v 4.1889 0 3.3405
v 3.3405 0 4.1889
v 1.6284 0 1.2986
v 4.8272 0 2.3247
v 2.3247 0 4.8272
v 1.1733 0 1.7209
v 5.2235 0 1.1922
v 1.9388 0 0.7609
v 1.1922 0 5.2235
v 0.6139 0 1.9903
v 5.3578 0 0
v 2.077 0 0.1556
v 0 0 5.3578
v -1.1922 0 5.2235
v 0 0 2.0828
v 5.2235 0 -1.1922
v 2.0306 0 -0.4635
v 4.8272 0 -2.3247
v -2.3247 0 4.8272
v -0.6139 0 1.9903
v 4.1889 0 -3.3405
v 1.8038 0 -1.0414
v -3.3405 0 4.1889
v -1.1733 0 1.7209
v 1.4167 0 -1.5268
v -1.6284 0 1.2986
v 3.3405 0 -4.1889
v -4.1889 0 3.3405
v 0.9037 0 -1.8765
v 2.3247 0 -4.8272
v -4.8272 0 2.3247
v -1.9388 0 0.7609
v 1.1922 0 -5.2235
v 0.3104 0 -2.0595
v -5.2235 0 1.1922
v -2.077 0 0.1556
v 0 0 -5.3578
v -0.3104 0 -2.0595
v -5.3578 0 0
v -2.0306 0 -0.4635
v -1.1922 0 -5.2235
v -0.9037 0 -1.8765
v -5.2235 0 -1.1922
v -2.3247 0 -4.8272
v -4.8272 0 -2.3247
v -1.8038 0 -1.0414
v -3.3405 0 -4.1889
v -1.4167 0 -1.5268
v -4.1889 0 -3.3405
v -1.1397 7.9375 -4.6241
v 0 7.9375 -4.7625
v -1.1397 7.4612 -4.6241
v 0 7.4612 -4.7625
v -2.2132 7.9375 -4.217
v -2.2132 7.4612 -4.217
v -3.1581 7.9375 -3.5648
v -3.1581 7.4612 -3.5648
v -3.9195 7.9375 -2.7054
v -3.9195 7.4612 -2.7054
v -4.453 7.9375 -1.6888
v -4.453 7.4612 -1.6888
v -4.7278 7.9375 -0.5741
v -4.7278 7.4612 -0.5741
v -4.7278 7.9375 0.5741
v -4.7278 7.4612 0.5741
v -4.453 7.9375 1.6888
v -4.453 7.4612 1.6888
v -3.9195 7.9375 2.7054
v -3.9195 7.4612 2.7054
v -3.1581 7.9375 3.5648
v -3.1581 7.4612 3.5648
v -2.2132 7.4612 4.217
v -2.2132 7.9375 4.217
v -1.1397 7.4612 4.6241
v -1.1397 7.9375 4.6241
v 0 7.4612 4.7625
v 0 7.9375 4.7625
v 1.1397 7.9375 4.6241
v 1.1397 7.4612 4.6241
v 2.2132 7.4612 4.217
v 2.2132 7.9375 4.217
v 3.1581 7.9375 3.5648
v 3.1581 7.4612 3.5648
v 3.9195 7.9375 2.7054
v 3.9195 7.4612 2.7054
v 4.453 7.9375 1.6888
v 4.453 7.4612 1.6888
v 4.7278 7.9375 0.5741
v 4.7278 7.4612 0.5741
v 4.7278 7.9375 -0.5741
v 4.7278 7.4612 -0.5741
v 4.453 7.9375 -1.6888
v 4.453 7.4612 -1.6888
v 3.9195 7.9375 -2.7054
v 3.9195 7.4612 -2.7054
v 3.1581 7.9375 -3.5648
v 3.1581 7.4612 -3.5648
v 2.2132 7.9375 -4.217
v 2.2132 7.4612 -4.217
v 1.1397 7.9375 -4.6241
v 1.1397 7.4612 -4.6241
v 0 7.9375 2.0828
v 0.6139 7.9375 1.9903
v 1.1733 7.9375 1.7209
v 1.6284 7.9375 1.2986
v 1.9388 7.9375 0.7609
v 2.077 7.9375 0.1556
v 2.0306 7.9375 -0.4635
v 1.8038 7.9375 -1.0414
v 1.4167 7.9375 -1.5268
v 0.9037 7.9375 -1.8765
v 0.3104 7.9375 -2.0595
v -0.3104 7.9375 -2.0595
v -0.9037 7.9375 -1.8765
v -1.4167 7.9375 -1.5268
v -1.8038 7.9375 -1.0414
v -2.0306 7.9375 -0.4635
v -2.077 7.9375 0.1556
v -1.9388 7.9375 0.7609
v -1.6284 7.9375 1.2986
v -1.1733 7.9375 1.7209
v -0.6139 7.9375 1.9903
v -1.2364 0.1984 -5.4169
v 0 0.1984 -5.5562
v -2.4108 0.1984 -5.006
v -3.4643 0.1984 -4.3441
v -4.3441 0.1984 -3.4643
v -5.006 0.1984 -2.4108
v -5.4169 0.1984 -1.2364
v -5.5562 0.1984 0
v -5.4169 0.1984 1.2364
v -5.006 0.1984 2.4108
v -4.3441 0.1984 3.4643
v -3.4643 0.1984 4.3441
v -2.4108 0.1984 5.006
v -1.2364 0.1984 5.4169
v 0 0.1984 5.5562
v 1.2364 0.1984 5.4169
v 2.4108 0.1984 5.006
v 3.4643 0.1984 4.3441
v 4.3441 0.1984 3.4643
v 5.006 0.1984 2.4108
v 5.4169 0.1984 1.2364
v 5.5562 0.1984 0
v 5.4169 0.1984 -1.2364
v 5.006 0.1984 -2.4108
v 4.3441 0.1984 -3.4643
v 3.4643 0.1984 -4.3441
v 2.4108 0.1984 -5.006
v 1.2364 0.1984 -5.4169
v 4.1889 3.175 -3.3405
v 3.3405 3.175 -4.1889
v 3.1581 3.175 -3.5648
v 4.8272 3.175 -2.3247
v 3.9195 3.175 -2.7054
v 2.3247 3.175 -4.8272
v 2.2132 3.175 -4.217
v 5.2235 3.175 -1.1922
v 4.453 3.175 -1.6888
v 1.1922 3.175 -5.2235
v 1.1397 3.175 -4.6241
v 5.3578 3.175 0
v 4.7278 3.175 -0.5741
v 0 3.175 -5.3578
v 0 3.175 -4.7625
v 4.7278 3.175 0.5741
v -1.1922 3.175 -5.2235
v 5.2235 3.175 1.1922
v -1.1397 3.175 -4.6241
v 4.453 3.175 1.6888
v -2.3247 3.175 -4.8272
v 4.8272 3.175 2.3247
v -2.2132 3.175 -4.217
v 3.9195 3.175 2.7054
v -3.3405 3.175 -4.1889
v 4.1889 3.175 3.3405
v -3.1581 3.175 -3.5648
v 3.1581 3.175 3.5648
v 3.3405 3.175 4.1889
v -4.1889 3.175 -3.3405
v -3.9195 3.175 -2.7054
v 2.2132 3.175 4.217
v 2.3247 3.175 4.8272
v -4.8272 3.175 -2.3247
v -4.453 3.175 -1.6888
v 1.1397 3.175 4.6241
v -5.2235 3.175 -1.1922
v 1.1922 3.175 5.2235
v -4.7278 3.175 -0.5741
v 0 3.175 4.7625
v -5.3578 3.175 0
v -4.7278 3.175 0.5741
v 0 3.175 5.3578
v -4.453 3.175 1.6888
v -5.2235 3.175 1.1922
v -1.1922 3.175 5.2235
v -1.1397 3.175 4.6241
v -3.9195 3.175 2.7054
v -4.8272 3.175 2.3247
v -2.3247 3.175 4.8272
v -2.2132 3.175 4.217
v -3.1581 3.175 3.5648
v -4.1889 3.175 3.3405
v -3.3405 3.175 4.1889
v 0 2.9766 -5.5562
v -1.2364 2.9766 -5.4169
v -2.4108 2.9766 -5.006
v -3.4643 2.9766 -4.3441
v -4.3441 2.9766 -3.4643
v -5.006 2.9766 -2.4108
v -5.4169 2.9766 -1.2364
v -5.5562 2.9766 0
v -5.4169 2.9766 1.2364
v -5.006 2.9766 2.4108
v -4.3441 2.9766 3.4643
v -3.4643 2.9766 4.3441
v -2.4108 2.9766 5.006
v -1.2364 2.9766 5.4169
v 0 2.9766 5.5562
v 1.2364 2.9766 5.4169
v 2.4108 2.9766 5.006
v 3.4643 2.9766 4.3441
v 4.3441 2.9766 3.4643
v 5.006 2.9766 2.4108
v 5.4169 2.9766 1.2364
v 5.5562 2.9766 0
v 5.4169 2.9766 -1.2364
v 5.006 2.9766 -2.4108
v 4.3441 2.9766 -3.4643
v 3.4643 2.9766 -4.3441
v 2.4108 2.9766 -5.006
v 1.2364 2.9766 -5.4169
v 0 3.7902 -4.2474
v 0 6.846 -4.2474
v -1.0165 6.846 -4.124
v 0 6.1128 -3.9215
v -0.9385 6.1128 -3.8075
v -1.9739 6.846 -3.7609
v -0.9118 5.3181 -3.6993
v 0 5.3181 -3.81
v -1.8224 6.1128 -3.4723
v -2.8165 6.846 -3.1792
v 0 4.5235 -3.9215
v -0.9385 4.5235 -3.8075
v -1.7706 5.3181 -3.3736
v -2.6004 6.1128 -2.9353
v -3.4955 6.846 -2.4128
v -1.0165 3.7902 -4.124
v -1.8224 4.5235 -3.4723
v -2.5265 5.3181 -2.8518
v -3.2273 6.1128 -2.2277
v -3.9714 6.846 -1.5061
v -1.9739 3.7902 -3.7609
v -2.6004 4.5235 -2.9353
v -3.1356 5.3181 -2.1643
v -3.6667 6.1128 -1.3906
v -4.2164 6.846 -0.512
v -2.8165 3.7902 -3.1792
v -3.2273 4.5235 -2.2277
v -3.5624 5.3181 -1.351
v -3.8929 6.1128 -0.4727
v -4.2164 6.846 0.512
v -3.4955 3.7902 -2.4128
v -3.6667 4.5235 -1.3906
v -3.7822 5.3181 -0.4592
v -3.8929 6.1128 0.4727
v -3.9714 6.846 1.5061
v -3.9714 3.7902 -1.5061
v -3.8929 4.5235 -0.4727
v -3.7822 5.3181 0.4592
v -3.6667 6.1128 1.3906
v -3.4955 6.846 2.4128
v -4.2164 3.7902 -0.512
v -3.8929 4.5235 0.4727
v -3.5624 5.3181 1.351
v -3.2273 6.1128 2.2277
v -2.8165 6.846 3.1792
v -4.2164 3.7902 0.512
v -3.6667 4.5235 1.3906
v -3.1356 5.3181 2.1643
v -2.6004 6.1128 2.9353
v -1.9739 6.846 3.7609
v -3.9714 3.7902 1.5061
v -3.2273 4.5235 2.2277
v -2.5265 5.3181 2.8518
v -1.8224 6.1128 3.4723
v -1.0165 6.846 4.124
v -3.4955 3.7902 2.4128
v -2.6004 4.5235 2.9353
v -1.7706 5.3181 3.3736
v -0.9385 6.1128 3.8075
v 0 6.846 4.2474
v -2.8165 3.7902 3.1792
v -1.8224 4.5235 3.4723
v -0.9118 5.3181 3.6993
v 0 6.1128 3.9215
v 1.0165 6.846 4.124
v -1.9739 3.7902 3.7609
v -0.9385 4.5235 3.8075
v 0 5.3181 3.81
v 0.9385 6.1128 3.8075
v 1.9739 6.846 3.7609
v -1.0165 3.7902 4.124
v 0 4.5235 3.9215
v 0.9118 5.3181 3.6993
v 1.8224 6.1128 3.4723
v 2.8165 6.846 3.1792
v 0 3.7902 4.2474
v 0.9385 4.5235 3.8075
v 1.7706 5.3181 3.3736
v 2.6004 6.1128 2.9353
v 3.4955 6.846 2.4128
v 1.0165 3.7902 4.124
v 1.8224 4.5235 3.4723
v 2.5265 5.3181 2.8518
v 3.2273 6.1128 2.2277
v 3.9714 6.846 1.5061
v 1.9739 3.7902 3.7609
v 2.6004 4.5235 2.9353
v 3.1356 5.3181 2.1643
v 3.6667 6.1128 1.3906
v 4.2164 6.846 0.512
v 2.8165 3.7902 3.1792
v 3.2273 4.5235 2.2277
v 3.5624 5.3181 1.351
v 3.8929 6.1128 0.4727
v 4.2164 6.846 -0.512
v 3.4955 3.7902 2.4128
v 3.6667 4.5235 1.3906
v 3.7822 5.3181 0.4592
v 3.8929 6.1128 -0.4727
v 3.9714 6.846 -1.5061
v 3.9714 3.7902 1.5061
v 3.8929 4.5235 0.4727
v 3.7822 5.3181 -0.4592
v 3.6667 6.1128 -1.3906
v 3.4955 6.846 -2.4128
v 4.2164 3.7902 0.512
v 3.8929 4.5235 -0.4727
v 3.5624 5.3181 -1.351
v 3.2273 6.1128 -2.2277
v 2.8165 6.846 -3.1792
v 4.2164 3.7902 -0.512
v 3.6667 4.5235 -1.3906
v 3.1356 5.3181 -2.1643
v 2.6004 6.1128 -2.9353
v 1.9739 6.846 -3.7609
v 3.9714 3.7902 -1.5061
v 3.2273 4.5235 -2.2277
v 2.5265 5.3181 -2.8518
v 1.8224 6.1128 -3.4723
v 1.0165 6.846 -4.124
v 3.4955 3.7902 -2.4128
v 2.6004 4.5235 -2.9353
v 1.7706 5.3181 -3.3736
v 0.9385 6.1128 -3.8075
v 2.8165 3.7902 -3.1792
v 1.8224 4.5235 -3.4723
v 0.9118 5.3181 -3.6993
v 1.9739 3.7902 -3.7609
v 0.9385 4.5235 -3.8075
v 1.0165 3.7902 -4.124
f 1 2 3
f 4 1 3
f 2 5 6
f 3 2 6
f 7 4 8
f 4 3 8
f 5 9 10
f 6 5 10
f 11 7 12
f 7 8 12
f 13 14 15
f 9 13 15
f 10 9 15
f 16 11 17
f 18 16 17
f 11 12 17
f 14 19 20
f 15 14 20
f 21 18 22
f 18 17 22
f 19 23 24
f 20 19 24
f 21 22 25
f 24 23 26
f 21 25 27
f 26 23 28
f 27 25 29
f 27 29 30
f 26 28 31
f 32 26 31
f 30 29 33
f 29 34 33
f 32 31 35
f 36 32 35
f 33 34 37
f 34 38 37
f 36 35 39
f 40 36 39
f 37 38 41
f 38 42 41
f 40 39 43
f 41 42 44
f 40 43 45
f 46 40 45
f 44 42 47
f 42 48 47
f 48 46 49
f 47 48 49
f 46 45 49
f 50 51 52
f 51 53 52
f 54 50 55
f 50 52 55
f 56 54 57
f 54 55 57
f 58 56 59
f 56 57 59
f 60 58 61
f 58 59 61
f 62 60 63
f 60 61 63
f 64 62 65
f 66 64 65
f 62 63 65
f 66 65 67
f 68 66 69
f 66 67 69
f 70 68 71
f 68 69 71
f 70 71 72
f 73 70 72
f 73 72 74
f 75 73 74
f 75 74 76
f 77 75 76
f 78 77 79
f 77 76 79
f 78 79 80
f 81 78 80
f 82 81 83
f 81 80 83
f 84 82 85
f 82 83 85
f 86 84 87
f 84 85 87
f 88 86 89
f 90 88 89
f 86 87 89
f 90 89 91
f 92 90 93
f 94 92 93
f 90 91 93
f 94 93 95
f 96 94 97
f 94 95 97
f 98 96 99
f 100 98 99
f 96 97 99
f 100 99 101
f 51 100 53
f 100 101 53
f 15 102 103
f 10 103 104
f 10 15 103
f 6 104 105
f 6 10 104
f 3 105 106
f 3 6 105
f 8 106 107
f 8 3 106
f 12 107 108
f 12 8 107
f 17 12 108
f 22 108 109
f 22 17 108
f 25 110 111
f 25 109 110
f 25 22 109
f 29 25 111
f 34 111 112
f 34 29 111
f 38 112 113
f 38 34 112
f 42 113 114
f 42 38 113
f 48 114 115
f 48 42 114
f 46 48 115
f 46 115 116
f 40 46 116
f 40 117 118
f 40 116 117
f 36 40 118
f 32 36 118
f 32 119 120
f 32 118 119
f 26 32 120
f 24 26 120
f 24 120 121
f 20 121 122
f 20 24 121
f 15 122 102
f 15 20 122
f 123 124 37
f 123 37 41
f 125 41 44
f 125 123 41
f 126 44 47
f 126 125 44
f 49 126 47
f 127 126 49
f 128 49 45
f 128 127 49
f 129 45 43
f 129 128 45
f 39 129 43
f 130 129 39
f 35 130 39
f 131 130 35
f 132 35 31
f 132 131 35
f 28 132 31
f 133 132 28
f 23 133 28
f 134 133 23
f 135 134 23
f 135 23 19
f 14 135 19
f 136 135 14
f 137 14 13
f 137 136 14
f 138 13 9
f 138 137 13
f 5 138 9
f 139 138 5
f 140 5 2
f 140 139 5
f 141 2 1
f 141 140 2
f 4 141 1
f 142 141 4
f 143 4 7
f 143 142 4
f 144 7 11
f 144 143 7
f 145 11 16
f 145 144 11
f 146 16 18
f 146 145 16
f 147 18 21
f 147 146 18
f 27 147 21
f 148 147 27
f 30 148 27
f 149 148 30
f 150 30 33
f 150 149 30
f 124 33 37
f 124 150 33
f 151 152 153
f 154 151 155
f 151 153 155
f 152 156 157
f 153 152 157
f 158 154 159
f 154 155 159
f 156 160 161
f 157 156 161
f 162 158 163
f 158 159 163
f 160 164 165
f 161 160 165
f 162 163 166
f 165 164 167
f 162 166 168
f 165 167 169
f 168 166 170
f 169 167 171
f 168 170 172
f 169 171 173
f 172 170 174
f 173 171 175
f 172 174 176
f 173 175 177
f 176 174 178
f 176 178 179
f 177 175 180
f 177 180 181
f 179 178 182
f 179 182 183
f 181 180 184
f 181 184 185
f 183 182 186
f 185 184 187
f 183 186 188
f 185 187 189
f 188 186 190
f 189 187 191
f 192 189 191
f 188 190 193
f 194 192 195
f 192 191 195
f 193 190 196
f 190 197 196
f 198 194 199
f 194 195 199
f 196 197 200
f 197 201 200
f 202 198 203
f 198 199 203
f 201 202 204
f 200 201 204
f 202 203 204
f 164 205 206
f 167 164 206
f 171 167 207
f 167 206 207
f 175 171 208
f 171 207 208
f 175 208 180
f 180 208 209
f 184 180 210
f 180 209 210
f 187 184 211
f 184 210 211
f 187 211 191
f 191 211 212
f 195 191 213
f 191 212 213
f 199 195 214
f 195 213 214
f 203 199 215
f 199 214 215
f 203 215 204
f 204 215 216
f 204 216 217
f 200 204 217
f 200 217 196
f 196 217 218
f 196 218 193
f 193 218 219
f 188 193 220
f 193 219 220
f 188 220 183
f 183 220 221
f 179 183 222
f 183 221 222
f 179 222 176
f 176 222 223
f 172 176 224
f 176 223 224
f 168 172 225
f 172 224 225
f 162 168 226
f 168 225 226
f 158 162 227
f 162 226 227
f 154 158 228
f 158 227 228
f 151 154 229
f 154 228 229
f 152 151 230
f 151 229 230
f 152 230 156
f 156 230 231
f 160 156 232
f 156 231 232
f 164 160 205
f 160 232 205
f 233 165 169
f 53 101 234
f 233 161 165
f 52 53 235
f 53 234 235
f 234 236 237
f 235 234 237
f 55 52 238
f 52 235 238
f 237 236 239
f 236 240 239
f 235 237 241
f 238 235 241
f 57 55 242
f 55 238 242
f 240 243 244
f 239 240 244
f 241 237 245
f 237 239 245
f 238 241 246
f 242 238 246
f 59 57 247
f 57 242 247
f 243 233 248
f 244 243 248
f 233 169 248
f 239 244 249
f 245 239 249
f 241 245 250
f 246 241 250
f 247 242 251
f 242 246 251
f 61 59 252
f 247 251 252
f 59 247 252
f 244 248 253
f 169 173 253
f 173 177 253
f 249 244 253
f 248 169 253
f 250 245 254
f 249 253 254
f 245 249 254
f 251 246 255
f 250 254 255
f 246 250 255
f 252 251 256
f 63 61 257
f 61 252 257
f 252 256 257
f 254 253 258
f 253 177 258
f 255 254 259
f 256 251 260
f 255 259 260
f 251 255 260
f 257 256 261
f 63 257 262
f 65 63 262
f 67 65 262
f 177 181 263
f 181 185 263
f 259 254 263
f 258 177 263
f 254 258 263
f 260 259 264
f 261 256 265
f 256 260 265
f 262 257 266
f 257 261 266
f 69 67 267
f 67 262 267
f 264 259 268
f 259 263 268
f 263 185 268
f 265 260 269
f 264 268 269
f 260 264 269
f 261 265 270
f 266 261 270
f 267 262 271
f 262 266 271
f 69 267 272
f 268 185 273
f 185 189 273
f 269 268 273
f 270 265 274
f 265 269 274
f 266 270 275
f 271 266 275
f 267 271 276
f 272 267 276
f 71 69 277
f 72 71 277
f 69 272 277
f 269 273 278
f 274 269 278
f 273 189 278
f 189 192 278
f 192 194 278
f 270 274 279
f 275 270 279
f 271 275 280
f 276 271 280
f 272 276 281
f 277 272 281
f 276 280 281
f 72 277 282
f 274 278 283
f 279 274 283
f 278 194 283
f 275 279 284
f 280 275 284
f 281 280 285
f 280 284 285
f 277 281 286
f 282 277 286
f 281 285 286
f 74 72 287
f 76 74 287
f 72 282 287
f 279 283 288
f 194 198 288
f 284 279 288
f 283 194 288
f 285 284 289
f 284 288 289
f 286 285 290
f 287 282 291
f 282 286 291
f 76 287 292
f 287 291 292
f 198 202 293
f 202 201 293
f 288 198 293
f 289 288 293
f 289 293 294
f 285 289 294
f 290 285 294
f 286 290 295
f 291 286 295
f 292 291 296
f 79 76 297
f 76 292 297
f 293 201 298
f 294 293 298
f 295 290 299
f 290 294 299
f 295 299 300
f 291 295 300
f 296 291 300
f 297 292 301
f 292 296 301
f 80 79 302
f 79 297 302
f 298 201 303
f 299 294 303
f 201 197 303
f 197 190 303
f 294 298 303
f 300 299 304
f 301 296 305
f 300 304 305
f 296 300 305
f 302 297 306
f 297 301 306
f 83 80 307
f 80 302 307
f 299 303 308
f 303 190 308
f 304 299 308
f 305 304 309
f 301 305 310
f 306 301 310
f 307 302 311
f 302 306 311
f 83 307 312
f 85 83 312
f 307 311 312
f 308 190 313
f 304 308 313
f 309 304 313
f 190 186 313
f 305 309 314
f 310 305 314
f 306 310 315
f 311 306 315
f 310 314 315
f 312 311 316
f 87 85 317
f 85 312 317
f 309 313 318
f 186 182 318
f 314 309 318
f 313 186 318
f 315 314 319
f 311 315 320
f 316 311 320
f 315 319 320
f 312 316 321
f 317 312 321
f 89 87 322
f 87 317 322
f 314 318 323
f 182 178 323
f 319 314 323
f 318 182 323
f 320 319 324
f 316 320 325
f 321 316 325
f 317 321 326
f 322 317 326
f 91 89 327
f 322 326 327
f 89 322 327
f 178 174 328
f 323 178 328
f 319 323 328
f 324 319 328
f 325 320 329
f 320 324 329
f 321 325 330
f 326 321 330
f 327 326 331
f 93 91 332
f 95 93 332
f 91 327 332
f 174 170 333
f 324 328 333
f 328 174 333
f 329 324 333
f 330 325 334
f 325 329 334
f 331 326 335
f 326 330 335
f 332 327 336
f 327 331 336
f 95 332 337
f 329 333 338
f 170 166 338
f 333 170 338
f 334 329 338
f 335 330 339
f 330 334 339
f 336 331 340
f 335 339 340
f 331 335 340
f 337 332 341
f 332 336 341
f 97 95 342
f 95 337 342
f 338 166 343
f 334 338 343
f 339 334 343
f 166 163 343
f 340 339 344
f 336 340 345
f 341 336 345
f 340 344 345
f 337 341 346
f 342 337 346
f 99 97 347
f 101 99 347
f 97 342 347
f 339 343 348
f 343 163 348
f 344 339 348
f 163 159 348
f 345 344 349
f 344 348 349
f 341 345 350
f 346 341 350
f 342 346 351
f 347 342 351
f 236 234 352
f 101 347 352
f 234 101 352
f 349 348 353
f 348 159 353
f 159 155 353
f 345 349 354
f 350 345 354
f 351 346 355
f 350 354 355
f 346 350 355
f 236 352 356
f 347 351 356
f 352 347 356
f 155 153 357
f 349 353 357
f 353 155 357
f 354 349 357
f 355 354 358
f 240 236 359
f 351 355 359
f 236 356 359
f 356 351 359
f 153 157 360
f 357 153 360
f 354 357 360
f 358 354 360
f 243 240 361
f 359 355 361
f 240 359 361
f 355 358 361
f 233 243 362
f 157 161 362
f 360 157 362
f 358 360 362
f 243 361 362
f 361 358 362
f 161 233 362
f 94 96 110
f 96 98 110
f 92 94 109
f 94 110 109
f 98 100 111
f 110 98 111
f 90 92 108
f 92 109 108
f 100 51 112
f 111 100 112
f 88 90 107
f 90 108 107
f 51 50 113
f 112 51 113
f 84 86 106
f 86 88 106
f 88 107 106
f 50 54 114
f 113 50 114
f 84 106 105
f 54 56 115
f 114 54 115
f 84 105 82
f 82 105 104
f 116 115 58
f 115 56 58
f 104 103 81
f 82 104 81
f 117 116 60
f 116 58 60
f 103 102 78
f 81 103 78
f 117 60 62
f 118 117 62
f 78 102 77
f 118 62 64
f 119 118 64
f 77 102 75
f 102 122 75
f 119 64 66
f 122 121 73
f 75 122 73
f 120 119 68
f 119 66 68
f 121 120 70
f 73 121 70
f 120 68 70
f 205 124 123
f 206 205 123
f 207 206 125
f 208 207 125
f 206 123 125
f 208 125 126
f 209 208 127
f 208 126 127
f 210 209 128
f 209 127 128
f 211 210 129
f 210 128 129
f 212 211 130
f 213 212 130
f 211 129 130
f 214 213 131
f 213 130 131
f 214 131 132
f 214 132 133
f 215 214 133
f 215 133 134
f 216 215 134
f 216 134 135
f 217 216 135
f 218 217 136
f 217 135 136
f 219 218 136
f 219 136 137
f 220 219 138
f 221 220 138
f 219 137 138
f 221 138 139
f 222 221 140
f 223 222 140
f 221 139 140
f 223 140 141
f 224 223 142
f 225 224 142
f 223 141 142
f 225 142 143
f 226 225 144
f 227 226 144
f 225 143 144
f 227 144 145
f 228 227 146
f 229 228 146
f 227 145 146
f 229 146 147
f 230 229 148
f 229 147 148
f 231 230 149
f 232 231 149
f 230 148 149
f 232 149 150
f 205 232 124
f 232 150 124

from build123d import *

# Parameters (mm, degrees)
SKETCH3_R          = 2.0828
CUT_EXTRUDE1_DEPTH = 12.169052528
CHAMFER1_SIZE      = 0.1984375


with BuildPart() as part:
    # Sketch1 → Revolve1 (revolve)
    with BuildSketch(Plane.XY):
        with BuildLine():
            Line((0, 7.9375), (-4.7625, 7.9375))
            Line((-4.7625, 7.9375), (-4.7625, 7.46125))
            ThreePointArc((-4.7625, 7.46125), (-3.81, 5.318125), (-4.7625, 3.175))
            Line((-4.7625, 3.175), (-5.55625, 3.175))
            Line((-5.55625, 3.175), (-5.55625, 0))
            Line((-5.55625, 0), (0, 0))
            Line((0, 0), (0, 7.9375))
        make_face()
    revolve(axis=Axis((0, 0, 0), (0, 1, 0)))

    # Sketch3 → Cut-Extrude1 (cut, through all)
    with BuildSketch(Plane(origin=(0, 0, 0), x_dir=(1, 0, 0), z_dir=(0, 1, 0))):
        Circle(SKETCH3_R)
    extrude(amount=CUT_EXTRUDE1_DEPTH, mode=Mode.SUBTRACT)

    # Chamfer1
    chamfer1_edges = [part.edges().sort_by_distance(p)[0] for p in [
        (5.55625, 3.175, 0),
        (5.55625, 0, 0),
    ]]
    chamfer(chamfer1_edges, length=CHAMFER1_SIZE)


solid = part.part
